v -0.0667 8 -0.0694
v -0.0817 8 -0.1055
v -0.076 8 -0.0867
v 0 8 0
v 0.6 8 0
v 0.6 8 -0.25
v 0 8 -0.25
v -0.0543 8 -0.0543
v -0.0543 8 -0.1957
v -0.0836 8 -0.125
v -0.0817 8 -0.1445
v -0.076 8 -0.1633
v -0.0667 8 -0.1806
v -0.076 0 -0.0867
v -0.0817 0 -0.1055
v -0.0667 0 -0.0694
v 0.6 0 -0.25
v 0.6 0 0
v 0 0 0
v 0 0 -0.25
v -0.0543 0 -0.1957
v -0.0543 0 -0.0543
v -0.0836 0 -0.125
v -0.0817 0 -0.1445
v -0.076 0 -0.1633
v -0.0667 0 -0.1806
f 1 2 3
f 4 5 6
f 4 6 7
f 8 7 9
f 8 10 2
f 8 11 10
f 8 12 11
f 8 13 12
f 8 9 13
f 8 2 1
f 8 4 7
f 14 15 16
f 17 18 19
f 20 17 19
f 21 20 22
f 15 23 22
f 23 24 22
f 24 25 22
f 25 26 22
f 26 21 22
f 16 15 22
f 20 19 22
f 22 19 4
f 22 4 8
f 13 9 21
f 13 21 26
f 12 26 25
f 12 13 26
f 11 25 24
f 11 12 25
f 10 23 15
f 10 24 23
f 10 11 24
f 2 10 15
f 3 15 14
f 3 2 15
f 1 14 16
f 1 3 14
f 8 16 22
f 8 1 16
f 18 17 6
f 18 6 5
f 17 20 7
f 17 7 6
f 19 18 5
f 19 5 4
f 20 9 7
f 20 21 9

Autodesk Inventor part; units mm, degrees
ref_plane "YZ Plane" through (0, 0, 0) normal (1, 0, 0) x (0, 1, 0)
ref_plane "XZ Plane" through (0, 0, 0) normal (0, 1, 0) x (-1, 0, 0)
ref_plane "XY Plane" through (0, 0, 0) normal (0, 0, 1) x (1, 0, 0)
sketch "草圖1" plane through (0, 0, 0) normal (0, 1, 0) x (-1, 0, 0)
  line L0 (0, 0) -> (0, -0.25)
  line L1 (0, 0) -> (0, -0.25)
  line L2 (0, -0.25) -> (-0.6, -0.25)
  line L3 (-0.6, -0.25) -> (-0.6, 0)
  line L4 (-0.6, 0) -> (0, 0)
  line L5 (0, 0) -> (0.125, -0.125)
  line L6 (0.125, -0.125) -> (0, -0.25)
  dimension "d0" = 0.25
  dimension "d1" = 0.6
  dimension "d2" = 45
extrude "擠出1" add sketch "草圖1" along normal blind 8
fillet "圓角1" radius 0.1 1 edges at (-0.125, 4, -0.125)
properties part number "窗側柱"
